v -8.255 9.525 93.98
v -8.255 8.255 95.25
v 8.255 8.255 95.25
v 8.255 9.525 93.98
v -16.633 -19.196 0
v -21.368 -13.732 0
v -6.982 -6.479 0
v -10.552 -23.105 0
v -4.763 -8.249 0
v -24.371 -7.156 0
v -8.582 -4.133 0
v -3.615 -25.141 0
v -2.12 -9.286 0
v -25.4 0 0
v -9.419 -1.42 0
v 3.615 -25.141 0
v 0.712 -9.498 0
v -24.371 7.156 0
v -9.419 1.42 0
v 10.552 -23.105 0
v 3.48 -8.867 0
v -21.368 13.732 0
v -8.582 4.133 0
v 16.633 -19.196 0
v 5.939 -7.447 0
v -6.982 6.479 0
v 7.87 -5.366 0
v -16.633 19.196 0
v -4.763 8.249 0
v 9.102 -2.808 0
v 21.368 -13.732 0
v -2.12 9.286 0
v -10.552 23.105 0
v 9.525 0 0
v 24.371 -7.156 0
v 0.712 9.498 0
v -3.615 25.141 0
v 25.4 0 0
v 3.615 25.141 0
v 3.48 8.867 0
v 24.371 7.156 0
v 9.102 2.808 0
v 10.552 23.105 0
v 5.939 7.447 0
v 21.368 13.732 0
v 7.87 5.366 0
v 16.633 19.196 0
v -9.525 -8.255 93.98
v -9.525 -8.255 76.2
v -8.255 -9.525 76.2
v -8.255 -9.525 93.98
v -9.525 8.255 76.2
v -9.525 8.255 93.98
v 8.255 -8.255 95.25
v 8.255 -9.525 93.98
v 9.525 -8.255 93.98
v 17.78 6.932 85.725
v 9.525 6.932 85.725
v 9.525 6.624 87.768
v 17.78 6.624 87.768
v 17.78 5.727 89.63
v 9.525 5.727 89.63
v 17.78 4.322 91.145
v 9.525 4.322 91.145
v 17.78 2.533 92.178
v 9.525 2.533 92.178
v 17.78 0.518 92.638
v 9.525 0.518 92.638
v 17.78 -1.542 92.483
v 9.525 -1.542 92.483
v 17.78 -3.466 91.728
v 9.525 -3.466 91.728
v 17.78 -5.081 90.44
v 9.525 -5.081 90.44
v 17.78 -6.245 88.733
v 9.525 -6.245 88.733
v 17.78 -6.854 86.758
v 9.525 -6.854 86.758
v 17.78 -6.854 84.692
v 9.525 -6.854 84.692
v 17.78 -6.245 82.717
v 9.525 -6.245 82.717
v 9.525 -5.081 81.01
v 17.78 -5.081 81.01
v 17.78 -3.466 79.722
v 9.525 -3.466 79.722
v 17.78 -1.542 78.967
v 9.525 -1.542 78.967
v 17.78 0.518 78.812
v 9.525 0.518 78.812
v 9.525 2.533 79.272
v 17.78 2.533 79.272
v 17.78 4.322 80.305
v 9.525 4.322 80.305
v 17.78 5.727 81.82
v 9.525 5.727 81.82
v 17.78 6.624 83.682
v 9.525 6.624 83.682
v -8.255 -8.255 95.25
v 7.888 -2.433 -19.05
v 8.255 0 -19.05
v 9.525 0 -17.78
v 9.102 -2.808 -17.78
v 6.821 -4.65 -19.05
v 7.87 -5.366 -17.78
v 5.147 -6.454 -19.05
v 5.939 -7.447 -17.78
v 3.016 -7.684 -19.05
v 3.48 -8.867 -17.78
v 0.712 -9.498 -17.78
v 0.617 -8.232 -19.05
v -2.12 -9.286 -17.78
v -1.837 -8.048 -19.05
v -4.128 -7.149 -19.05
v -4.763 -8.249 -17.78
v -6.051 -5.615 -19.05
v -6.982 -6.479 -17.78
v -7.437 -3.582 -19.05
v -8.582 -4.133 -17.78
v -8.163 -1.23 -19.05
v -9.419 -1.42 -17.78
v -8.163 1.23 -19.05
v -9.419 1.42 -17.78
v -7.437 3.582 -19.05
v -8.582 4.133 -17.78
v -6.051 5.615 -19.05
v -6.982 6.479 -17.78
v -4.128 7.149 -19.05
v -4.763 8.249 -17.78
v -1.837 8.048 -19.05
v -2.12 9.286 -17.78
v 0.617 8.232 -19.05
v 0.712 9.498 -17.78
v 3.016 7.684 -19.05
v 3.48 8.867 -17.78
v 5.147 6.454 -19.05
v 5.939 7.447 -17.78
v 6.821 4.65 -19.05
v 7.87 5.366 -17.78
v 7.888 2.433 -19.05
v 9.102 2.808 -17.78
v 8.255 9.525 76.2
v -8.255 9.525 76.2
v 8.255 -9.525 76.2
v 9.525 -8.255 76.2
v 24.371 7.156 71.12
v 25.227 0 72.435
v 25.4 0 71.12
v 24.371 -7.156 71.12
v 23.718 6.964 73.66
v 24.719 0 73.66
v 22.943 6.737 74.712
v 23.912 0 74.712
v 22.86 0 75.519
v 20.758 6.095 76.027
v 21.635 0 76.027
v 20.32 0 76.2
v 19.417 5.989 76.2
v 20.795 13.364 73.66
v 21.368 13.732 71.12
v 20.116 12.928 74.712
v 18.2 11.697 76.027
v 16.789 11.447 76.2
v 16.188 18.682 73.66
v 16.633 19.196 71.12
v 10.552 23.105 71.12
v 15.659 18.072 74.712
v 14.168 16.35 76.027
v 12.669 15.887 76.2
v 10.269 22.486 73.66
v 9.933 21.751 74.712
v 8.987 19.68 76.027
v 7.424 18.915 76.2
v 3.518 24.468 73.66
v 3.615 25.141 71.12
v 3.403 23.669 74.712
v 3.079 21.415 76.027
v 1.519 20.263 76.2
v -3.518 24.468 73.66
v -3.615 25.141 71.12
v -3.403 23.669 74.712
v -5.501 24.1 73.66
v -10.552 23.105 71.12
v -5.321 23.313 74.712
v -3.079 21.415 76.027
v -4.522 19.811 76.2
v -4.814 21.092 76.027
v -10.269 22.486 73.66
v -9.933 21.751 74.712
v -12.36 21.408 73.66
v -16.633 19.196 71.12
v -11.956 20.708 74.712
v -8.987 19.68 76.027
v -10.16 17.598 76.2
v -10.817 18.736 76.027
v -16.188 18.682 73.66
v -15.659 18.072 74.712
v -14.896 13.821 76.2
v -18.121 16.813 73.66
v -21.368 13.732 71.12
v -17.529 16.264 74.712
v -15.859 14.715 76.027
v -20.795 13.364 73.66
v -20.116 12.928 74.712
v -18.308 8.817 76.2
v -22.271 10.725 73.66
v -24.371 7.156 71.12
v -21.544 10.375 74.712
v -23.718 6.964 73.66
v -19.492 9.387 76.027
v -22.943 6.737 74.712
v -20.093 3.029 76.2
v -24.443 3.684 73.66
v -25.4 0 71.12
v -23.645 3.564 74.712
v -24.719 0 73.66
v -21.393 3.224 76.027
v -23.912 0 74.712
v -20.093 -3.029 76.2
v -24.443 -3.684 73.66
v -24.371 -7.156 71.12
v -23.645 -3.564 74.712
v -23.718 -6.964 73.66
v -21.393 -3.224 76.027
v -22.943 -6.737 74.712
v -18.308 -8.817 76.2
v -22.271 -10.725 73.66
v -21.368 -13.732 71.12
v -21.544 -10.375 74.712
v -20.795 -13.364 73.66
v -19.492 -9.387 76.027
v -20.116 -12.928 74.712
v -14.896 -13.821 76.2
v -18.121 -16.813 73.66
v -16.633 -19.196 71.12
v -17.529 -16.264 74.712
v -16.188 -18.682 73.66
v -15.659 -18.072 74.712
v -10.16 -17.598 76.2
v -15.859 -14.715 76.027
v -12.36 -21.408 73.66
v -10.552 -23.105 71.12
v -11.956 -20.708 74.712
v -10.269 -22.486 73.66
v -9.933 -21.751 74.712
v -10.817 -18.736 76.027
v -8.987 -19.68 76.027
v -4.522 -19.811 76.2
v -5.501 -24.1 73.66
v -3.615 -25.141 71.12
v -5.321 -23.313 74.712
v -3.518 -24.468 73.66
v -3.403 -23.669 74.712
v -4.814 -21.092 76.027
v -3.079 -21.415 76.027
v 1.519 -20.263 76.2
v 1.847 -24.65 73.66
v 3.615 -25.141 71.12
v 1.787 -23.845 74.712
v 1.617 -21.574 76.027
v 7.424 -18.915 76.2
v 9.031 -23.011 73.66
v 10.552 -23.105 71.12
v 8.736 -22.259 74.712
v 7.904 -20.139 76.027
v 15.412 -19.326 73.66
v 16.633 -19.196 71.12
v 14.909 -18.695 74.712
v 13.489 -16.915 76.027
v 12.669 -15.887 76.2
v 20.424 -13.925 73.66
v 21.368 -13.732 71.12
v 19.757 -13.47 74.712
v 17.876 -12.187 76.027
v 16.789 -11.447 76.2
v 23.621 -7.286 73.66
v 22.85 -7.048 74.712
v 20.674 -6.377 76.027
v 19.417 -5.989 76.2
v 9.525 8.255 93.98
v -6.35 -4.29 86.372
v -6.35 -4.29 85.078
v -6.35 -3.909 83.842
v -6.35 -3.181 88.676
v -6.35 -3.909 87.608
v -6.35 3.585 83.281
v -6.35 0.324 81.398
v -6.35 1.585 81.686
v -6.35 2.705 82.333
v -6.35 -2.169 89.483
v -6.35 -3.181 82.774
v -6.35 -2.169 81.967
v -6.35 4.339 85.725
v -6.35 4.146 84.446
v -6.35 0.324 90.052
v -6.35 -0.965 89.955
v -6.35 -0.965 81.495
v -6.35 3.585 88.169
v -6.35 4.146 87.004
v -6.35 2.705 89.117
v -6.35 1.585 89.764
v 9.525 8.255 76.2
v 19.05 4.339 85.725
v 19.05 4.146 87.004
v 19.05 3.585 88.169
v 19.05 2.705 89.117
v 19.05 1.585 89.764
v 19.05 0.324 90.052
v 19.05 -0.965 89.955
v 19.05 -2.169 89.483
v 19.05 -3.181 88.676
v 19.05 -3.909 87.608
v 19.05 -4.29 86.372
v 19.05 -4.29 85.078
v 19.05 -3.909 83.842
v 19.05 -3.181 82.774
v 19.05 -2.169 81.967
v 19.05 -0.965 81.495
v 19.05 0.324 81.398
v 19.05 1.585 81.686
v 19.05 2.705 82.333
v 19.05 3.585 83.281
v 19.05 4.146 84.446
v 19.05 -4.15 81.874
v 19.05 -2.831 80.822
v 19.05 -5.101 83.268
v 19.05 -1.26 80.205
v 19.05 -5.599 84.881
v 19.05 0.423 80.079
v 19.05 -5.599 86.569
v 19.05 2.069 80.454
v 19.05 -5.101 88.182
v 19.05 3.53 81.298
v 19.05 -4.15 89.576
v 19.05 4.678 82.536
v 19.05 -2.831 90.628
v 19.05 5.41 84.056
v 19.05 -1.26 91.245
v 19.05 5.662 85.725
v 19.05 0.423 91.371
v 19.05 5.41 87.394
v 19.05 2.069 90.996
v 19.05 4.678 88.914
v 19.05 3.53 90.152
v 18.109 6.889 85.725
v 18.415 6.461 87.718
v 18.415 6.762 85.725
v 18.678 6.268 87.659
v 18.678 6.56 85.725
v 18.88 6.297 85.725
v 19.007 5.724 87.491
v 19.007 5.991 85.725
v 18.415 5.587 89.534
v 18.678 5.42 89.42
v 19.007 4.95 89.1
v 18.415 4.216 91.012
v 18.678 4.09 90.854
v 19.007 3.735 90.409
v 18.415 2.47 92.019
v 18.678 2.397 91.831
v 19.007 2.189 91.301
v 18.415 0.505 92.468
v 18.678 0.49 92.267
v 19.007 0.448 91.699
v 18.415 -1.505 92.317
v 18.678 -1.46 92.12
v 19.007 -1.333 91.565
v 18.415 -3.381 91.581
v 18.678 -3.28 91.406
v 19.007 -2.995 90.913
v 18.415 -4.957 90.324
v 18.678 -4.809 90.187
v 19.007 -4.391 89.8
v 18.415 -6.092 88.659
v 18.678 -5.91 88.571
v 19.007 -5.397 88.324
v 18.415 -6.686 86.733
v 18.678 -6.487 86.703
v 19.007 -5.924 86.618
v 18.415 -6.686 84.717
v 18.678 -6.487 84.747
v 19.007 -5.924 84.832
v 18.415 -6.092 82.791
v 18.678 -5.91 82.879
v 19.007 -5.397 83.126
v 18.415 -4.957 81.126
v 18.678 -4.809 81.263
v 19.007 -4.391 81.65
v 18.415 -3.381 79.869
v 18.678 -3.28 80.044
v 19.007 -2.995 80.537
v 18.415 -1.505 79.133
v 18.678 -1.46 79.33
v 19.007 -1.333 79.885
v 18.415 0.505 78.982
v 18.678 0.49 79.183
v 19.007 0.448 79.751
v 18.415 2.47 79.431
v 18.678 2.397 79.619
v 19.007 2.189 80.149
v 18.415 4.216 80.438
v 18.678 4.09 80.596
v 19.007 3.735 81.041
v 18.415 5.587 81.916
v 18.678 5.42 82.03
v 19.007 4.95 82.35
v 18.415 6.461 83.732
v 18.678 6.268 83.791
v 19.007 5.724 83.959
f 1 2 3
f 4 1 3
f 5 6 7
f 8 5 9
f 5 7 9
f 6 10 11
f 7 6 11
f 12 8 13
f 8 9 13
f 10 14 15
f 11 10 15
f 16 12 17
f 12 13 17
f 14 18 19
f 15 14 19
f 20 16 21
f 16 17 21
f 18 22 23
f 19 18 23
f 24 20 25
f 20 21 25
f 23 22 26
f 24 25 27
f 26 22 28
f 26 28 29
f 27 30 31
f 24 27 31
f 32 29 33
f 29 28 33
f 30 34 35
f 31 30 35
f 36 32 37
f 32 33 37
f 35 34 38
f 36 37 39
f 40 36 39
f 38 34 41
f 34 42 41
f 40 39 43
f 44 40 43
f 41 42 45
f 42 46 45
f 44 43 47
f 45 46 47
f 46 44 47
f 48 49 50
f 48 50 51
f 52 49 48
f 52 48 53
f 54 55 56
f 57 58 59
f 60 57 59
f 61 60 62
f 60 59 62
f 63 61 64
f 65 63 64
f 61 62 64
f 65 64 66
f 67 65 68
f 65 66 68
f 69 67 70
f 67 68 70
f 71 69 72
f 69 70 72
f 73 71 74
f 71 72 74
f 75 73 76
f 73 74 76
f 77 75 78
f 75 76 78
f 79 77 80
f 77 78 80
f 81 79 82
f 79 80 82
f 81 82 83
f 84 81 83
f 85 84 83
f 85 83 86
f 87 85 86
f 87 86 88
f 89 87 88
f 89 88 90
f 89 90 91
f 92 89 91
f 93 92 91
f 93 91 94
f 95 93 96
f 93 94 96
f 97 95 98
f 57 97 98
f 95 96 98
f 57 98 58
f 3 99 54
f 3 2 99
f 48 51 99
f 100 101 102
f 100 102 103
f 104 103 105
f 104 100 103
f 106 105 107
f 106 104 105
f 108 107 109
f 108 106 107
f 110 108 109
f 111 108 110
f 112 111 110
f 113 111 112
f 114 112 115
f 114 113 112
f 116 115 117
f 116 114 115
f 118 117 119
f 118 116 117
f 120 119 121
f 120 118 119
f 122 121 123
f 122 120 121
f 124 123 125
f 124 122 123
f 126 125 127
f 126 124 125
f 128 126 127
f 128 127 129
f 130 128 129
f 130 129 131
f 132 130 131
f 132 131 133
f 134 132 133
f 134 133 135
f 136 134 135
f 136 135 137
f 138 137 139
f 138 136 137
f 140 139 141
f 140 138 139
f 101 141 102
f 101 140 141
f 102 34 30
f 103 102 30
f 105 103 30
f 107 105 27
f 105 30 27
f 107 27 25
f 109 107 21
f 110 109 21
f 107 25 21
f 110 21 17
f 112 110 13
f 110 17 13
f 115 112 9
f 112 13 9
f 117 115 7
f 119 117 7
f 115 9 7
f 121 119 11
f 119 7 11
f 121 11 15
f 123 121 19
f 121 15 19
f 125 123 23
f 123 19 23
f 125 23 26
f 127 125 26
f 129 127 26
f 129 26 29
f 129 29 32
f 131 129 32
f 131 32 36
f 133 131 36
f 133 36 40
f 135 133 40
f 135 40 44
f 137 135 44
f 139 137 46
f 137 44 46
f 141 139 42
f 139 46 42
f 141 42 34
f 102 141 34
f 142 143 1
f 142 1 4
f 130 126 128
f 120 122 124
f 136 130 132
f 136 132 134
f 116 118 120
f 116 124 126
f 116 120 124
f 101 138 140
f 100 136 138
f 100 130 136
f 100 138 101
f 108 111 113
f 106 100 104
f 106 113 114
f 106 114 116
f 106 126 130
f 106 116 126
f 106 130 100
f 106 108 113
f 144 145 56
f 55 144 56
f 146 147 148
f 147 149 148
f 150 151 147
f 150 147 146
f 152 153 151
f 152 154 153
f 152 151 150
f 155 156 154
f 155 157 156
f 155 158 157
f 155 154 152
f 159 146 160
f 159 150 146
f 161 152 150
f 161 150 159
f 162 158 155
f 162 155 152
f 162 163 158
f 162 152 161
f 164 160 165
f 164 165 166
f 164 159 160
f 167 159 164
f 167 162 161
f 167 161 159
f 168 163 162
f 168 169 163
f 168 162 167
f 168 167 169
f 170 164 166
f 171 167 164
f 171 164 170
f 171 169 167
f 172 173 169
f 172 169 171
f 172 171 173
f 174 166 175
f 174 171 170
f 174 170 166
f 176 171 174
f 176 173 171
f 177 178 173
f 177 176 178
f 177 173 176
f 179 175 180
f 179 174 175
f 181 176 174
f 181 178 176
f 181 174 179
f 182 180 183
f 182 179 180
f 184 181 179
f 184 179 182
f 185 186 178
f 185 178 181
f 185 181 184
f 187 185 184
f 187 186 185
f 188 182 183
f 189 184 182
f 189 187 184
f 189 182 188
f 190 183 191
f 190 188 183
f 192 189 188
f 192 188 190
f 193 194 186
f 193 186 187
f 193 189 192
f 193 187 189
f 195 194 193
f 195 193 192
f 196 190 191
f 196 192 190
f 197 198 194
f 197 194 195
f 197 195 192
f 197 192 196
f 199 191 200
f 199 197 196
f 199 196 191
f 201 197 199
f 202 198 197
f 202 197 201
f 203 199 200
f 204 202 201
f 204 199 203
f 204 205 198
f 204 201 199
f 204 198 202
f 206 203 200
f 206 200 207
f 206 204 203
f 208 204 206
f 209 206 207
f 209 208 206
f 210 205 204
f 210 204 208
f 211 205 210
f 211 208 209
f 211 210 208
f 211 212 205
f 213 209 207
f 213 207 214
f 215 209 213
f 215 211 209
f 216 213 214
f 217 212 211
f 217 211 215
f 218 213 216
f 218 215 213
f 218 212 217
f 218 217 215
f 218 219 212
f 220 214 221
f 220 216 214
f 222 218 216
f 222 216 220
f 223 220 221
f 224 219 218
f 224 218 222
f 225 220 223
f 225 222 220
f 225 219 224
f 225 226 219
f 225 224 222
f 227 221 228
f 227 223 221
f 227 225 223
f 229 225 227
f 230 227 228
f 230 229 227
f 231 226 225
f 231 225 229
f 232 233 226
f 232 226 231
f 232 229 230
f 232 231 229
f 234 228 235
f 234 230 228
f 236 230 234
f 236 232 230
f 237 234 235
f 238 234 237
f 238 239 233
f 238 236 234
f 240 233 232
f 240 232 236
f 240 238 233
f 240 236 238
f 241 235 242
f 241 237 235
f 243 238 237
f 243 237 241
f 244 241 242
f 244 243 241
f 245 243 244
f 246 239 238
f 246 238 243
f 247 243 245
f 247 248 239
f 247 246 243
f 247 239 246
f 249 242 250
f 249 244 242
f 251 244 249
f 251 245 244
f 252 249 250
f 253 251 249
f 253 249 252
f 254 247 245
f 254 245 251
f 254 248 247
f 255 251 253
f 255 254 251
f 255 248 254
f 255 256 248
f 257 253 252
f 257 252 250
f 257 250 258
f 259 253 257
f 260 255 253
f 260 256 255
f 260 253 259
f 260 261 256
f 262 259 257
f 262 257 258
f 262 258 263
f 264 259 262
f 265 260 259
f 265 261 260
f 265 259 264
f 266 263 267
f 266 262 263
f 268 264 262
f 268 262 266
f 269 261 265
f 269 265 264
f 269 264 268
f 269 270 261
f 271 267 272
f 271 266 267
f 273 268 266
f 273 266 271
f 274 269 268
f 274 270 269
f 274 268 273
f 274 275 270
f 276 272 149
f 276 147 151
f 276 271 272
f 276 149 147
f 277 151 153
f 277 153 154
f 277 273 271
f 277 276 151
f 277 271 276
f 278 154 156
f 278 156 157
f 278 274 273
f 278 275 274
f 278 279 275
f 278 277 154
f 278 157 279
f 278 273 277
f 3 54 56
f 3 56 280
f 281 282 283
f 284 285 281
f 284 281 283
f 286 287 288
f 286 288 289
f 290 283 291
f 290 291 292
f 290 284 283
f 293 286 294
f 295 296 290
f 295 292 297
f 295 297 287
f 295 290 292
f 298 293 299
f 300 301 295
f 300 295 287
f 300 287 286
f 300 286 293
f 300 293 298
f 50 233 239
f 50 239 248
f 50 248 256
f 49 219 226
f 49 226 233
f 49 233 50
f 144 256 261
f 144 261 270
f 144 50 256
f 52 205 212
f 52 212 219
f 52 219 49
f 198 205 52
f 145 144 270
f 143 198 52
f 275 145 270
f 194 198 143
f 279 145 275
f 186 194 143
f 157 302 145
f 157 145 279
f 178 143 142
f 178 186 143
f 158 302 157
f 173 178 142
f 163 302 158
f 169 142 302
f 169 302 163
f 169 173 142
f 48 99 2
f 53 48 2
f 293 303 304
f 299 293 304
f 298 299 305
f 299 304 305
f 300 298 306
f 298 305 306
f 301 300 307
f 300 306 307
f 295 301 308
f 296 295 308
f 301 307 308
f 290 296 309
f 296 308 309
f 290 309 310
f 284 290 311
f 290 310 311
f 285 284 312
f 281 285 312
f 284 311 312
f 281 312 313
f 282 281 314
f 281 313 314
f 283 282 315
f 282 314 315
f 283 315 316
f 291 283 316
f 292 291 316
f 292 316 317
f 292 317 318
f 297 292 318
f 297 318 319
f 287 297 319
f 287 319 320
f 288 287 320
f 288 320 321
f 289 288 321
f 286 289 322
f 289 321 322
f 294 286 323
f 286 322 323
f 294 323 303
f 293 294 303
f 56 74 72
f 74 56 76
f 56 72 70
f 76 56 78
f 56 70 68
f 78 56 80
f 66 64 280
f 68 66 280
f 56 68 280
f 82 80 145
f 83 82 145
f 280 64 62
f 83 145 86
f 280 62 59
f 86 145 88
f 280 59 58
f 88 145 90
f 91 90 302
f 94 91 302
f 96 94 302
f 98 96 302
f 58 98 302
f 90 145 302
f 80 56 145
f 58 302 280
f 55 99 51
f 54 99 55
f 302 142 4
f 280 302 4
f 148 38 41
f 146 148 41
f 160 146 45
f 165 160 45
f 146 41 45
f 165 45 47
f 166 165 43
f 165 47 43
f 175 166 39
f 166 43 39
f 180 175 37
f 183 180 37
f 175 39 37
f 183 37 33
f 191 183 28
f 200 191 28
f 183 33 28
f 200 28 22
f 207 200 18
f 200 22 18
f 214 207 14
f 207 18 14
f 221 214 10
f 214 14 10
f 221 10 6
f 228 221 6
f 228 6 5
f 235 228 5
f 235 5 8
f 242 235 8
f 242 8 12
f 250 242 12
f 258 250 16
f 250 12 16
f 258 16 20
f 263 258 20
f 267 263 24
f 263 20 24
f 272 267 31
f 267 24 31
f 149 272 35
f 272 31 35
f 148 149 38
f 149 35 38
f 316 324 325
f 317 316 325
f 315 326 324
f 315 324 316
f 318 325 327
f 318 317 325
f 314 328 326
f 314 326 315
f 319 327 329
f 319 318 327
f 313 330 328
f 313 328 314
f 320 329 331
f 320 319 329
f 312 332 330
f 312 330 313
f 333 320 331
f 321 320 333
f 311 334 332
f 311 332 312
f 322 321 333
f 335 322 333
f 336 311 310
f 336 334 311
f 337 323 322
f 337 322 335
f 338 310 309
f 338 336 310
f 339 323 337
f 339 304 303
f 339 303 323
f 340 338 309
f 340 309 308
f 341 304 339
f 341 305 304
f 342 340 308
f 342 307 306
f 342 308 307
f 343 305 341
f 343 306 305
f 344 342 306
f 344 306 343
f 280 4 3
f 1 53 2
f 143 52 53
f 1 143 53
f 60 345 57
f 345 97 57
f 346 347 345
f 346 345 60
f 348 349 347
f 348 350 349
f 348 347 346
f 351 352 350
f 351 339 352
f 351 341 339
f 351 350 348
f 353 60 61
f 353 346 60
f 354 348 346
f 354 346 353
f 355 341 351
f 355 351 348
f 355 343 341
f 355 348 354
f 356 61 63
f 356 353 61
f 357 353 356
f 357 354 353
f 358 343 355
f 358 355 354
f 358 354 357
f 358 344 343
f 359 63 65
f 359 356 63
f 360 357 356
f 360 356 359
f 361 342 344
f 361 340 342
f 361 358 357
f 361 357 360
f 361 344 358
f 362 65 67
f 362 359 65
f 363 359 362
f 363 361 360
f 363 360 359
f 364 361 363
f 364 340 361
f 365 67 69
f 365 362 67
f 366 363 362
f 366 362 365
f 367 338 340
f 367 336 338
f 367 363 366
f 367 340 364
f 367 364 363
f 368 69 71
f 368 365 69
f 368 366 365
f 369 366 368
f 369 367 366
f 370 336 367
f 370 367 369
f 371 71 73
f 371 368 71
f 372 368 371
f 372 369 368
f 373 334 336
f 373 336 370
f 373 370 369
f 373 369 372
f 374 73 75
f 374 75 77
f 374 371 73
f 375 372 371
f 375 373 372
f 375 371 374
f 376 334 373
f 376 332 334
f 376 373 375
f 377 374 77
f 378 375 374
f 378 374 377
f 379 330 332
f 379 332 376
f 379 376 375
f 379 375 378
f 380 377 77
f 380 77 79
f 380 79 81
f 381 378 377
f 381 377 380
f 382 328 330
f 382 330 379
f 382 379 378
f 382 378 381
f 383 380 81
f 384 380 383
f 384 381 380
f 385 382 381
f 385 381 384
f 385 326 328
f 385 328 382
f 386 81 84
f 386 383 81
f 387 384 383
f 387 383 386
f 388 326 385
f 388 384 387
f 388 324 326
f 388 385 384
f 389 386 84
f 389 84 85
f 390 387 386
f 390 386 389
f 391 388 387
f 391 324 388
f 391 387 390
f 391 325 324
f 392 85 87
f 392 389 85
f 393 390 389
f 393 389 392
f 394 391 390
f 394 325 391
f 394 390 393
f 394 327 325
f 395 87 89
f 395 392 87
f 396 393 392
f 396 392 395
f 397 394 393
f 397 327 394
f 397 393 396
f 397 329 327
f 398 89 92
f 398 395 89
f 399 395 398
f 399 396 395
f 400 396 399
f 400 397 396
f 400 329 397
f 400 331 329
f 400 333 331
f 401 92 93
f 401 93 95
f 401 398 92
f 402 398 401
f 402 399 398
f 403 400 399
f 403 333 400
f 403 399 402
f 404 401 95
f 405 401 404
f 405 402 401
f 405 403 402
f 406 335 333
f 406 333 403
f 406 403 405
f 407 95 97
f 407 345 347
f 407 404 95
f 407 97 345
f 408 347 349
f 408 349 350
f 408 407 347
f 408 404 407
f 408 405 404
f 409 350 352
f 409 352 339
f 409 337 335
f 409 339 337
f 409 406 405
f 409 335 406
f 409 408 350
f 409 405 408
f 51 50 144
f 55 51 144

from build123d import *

# Parameters (mm, degrees)
F0_R      = 25.4
F1_DEPTH  = 76.2
F2_R      = 9.525
F3_DEPTH  = 19.05
F4_R      = 5.08
F5_SIZE   = 1.27
F6_W      = 19.05
F6_H      = 19.05
F7_DEPTH  = 19.05
F8_R      = 6.931889
F9_DEPTH  = 9.525
F10_R     = 4.338824
F11_DEPTH = 25.4
F12_SIZE  = 1.27
F13_R     = 1.27


with BuildPart() as f1:
    # F0 (on Top) → F1 (new body)
    with BuildSketch(Plane.XY):
        Circle(F0_R)
    extrude(amount=F1_DEPTH)

    # F2 (on face) → F3 (join)
    with BuildSketch(Plane(origin=(0, 0, 0), x_dir=(1, 0, 0), z_dir=(0, 0, -1))):
        Circle(F2_R)
    extrude(amount=F3_DEPTH)

    # F4
    f4_edges = [f1.edges().sort_by_distance(p)[0] for p in [
        (-25.4, 0, 76.2),
    ]]
    fillet(f4_edges, radius=F4_R)

    # F5
    f5_edges = [f1.edges().sort_by_distance(p)[0] for p in [
        (-9.525, 0, -19.05),
    ]]
    chamfer(f5_edges, length=F5_SIZE)

    # F6 (on face) → F7 (join)
    with BuildSketch(Plane.XY.offset(76.2)):
        Rectangle(F6_W, F6_H)
    extrude(amount=F7_DEPTH)

    # F8 (on face) → F9 (join)
    with BuildSketch(Plane.YZ.offset(9.525)):
        with Locations((0, 85.725)):
            Circle(F8_R)
    extrude(amount=F9_DEPTH)

    # F10 (on face) → F11 (cut)
    with BuildSketch(Plane.YZ.offset(19.05)):
        with Locations((0, 85.725)):
            Circle(F10_R)
    extrude(amount=-F11_DEPTH, mode=Mode.SUBTRACT)

    # F12
    f12_edges = [f1.edges().sort_by_distance(p)[0] for p in [
        (0, -9.525, 95.25),
        (-9.525, -9.525, 85.725),
        (9.525, -9.525, 85.725),
        (-9.525, 9.525, 85.725),
        (-9.525, 0, 95.25),
        (9.525, 9.525, 85.725),
        (0, 9.525, 95.25),
        (9.525, 0, 95.25),
    ]]
    chamfer(f12_edges, length=F12_SIZE)

    # F13
    f13_edges = [f1.edges().sort_by_distance(p)[0] for p in [
        (19.05, -6.931889, 85.725),
    ]]
    fillet(f13_edges, radius=F13_R)


solid = f1.part
